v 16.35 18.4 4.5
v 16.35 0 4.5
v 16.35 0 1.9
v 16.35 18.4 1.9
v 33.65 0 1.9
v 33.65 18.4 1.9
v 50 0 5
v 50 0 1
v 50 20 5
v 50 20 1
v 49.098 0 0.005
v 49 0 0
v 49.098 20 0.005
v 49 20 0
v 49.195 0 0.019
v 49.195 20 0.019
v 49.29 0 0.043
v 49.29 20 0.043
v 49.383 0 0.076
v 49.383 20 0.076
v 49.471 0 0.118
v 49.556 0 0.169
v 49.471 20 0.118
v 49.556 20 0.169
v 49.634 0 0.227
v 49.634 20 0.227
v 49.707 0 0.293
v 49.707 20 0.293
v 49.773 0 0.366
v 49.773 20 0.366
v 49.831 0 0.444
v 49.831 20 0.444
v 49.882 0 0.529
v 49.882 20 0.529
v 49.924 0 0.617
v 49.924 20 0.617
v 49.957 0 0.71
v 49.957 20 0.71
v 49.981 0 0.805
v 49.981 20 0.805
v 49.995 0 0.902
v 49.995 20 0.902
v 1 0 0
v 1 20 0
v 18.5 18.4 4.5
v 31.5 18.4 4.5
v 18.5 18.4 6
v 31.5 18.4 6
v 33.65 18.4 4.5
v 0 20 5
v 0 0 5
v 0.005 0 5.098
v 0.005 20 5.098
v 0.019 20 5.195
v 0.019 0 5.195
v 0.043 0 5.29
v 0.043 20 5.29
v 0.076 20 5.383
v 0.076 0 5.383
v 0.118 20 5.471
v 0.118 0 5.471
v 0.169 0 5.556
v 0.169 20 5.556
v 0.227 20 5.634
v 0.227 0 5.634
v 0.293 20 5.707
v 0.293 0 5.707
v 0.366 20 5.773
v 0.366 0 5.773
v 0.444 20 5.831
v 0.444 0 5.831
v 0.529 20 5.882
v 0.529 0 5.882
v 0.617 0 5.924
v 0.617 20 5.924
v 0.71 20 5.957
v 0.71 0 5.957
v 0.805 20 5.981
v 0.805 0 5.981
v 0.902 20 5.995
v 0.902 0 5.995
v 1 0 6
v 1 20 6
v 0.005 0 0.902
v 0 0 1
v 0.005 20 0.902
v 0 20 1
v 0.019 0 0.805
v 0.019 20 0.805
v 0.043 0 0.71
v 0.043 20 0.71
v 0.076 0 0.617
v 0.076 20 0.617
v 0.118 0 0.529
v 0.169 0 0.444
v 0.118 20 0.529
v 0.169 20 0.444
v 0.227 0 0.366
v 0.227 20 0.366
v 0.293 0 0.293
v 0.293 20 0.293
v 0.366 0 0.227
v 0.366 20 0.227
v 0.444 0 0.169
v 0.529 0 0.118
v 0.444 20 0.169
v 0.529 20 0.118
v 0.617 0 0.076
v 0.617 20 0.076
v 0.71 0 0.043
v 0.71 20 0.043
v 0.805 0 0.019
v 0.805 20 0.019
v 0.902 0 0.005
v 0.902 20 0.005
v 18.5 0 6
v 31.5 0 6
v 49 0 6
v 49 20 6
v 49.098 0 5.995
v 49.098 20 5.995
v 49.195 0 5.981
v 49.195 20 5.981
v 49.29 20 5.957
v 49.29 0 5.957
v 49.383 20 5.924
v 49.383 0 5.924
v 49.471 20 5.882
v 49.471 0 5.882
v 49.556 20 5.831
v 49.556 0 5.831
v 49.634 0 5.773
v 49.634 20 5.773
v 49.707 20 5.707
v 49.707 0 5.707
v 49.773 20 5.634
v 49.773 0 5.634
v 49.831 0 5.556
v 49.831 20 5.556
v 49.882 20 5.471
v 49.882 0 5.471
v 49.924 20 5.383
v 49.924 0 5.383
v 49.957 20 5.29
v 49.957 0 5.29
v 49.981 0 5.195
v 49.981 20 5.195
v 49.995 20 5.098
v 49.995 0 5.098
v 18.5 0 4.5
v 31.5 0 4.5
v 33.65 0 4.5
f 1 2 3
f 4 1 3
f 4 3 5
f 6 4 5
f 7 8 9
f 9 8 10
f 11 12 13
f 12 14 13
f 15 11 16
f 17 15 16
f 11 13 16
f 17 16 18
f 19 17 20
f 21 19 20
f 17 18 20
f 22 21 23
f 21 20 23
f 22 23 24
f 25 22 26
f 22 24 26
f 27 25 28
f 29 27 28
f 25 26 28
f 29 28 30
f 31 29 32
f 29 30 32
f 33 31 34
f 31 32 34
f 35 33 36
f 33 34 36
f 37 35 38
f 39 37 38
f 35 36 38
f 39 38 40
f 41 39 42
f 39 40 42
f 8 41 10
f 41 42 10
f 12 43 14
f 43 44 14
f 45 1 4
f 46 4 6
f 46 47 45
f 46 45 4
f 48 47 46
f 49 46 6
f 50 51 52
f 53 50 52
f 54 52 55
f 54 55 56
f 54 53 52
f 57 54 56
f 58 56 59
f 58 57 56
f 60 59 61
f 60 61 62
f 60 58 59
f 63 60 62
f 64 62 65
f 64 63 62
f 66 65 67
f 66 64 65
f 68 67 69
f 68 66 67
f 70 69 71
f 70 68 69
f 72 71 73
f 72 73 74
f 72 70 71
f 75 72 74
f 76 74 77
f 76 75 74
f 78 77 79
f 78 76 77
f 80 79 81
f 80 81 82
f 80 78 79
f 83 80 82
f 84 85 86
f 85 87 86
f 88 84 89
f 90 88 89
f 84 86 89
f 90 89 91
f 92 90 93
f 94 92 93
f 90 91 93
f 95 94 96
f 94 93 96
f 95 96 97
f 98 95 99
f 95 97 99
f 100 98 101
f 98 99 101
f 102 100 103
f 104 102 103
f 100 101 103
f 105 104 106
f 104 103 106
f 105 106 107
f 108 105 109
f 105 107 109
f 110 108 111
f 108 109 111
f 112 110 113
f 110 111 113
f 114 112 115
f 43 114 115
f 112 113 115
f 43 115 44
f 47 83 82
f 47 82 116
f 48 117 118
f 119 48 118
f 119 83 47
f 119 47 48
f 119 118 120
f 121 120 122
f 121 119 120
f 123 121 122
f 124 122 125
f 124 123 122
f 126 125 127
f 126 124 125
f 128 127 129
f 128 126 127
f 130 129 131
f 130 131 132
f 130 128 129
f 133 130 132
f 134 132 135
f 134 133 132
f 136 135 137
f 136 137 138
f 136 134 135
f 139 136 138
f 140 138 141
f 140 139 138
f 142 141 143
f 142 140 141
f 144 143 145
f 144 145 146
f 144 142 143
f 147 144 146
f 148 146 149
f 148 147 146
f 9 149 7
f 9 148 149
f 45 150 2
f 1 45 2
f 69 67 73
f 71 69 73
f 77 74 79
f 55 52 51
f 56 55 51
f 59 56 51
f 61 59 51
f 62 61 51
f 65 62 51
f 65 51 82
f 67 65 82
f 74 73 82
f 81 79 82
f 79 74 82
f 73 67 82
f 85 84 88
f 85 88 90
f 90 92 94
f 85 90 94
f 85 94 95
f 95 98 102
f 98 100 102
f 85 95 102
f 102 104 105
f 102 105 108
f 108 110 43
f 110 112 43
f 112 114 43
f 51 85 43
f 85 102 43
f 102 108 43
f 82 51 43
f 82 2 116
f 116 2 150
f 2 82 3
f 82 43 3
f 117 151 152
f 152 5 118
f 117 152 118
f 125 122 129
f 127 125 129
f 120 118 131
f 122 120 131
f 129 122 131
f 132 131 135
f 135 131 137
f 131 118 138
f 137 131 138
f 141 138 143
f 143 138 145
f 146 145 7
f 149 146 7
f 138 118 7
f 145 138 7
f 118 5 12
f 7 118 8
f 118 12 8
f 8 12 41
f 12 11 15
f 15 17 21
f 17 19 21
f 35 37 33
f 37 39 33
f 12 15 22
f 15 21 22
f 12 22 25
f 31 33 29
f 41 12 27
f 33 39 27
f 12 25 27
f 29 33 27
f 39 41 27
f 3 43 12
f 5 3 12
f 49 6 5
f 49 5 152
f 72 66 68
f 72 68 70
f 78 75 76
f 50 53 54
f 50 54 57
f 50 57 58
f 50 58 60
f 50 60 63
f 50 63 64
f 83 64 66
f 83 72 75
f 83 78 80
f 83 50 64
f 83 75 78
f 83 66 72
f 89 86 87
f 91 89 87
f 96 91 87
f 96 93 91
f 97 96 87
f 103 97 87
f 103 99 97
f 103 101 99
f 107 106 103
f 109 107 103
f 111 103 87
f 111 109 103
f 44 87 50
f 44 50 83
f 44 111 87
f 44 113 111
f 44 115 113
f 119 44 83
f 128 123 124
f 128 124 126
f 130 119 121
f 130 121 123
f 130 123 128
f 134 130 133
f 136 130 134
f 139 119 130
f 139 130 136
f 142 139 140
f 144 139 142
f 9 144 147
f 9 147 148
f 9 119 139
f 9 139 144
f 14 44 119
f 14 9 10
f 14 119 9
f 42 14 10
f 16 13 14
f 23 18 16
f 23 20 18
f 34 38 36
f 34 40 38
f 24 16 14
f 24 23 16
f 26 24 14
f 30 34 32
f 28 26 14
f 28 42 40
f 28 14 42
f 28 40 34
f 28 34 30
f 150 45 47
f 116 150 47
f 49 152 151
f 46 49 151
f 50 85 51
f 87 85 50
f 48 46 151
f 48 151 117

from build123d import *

# Parameters (mm, degrees)
F0_W     = 50
F0_H     = 20
F1_DEPTH = 6
F2_W     = 13
F2_H     = 1.5
F3_DEPTH = 18.4
F4_R     = 1


with BuildPart() as f1:
    # F0 (on Top) → F1 (new body)
    with BuildSketch(Plane.XY):
        with Locations((25, 10)):
            Rectangle(F0_W, F0_H)
    extrude(amount=F1_DEPTH)

    # F2 (on face) → F3 (cut, through all)
    with BuildSketch(Plane.XZ):
        Polygon((18.5, 4.5), (16.35, 4.5), (16.35, 1.9), (33.65, 1.9), (33.65, 4.5), (31.5, 4.5), align=None)
        with Locations((25, 5.25)):
            Rectangle(F2_W, F2_H)
    extrude(amount=-F3_DEPTH, mode=Mode.SUBTRACT)

    # F4
    f4_edges = [f1.edges().sort_by_distance(p)[0] for p in [
        (50, 10, 6),
        (50, 10, 0),
        (0, 10, 0),
        (0, 10, 6),
    ]]
    fillet(f4_edges, radius=F4_R)


solid = f1.part
